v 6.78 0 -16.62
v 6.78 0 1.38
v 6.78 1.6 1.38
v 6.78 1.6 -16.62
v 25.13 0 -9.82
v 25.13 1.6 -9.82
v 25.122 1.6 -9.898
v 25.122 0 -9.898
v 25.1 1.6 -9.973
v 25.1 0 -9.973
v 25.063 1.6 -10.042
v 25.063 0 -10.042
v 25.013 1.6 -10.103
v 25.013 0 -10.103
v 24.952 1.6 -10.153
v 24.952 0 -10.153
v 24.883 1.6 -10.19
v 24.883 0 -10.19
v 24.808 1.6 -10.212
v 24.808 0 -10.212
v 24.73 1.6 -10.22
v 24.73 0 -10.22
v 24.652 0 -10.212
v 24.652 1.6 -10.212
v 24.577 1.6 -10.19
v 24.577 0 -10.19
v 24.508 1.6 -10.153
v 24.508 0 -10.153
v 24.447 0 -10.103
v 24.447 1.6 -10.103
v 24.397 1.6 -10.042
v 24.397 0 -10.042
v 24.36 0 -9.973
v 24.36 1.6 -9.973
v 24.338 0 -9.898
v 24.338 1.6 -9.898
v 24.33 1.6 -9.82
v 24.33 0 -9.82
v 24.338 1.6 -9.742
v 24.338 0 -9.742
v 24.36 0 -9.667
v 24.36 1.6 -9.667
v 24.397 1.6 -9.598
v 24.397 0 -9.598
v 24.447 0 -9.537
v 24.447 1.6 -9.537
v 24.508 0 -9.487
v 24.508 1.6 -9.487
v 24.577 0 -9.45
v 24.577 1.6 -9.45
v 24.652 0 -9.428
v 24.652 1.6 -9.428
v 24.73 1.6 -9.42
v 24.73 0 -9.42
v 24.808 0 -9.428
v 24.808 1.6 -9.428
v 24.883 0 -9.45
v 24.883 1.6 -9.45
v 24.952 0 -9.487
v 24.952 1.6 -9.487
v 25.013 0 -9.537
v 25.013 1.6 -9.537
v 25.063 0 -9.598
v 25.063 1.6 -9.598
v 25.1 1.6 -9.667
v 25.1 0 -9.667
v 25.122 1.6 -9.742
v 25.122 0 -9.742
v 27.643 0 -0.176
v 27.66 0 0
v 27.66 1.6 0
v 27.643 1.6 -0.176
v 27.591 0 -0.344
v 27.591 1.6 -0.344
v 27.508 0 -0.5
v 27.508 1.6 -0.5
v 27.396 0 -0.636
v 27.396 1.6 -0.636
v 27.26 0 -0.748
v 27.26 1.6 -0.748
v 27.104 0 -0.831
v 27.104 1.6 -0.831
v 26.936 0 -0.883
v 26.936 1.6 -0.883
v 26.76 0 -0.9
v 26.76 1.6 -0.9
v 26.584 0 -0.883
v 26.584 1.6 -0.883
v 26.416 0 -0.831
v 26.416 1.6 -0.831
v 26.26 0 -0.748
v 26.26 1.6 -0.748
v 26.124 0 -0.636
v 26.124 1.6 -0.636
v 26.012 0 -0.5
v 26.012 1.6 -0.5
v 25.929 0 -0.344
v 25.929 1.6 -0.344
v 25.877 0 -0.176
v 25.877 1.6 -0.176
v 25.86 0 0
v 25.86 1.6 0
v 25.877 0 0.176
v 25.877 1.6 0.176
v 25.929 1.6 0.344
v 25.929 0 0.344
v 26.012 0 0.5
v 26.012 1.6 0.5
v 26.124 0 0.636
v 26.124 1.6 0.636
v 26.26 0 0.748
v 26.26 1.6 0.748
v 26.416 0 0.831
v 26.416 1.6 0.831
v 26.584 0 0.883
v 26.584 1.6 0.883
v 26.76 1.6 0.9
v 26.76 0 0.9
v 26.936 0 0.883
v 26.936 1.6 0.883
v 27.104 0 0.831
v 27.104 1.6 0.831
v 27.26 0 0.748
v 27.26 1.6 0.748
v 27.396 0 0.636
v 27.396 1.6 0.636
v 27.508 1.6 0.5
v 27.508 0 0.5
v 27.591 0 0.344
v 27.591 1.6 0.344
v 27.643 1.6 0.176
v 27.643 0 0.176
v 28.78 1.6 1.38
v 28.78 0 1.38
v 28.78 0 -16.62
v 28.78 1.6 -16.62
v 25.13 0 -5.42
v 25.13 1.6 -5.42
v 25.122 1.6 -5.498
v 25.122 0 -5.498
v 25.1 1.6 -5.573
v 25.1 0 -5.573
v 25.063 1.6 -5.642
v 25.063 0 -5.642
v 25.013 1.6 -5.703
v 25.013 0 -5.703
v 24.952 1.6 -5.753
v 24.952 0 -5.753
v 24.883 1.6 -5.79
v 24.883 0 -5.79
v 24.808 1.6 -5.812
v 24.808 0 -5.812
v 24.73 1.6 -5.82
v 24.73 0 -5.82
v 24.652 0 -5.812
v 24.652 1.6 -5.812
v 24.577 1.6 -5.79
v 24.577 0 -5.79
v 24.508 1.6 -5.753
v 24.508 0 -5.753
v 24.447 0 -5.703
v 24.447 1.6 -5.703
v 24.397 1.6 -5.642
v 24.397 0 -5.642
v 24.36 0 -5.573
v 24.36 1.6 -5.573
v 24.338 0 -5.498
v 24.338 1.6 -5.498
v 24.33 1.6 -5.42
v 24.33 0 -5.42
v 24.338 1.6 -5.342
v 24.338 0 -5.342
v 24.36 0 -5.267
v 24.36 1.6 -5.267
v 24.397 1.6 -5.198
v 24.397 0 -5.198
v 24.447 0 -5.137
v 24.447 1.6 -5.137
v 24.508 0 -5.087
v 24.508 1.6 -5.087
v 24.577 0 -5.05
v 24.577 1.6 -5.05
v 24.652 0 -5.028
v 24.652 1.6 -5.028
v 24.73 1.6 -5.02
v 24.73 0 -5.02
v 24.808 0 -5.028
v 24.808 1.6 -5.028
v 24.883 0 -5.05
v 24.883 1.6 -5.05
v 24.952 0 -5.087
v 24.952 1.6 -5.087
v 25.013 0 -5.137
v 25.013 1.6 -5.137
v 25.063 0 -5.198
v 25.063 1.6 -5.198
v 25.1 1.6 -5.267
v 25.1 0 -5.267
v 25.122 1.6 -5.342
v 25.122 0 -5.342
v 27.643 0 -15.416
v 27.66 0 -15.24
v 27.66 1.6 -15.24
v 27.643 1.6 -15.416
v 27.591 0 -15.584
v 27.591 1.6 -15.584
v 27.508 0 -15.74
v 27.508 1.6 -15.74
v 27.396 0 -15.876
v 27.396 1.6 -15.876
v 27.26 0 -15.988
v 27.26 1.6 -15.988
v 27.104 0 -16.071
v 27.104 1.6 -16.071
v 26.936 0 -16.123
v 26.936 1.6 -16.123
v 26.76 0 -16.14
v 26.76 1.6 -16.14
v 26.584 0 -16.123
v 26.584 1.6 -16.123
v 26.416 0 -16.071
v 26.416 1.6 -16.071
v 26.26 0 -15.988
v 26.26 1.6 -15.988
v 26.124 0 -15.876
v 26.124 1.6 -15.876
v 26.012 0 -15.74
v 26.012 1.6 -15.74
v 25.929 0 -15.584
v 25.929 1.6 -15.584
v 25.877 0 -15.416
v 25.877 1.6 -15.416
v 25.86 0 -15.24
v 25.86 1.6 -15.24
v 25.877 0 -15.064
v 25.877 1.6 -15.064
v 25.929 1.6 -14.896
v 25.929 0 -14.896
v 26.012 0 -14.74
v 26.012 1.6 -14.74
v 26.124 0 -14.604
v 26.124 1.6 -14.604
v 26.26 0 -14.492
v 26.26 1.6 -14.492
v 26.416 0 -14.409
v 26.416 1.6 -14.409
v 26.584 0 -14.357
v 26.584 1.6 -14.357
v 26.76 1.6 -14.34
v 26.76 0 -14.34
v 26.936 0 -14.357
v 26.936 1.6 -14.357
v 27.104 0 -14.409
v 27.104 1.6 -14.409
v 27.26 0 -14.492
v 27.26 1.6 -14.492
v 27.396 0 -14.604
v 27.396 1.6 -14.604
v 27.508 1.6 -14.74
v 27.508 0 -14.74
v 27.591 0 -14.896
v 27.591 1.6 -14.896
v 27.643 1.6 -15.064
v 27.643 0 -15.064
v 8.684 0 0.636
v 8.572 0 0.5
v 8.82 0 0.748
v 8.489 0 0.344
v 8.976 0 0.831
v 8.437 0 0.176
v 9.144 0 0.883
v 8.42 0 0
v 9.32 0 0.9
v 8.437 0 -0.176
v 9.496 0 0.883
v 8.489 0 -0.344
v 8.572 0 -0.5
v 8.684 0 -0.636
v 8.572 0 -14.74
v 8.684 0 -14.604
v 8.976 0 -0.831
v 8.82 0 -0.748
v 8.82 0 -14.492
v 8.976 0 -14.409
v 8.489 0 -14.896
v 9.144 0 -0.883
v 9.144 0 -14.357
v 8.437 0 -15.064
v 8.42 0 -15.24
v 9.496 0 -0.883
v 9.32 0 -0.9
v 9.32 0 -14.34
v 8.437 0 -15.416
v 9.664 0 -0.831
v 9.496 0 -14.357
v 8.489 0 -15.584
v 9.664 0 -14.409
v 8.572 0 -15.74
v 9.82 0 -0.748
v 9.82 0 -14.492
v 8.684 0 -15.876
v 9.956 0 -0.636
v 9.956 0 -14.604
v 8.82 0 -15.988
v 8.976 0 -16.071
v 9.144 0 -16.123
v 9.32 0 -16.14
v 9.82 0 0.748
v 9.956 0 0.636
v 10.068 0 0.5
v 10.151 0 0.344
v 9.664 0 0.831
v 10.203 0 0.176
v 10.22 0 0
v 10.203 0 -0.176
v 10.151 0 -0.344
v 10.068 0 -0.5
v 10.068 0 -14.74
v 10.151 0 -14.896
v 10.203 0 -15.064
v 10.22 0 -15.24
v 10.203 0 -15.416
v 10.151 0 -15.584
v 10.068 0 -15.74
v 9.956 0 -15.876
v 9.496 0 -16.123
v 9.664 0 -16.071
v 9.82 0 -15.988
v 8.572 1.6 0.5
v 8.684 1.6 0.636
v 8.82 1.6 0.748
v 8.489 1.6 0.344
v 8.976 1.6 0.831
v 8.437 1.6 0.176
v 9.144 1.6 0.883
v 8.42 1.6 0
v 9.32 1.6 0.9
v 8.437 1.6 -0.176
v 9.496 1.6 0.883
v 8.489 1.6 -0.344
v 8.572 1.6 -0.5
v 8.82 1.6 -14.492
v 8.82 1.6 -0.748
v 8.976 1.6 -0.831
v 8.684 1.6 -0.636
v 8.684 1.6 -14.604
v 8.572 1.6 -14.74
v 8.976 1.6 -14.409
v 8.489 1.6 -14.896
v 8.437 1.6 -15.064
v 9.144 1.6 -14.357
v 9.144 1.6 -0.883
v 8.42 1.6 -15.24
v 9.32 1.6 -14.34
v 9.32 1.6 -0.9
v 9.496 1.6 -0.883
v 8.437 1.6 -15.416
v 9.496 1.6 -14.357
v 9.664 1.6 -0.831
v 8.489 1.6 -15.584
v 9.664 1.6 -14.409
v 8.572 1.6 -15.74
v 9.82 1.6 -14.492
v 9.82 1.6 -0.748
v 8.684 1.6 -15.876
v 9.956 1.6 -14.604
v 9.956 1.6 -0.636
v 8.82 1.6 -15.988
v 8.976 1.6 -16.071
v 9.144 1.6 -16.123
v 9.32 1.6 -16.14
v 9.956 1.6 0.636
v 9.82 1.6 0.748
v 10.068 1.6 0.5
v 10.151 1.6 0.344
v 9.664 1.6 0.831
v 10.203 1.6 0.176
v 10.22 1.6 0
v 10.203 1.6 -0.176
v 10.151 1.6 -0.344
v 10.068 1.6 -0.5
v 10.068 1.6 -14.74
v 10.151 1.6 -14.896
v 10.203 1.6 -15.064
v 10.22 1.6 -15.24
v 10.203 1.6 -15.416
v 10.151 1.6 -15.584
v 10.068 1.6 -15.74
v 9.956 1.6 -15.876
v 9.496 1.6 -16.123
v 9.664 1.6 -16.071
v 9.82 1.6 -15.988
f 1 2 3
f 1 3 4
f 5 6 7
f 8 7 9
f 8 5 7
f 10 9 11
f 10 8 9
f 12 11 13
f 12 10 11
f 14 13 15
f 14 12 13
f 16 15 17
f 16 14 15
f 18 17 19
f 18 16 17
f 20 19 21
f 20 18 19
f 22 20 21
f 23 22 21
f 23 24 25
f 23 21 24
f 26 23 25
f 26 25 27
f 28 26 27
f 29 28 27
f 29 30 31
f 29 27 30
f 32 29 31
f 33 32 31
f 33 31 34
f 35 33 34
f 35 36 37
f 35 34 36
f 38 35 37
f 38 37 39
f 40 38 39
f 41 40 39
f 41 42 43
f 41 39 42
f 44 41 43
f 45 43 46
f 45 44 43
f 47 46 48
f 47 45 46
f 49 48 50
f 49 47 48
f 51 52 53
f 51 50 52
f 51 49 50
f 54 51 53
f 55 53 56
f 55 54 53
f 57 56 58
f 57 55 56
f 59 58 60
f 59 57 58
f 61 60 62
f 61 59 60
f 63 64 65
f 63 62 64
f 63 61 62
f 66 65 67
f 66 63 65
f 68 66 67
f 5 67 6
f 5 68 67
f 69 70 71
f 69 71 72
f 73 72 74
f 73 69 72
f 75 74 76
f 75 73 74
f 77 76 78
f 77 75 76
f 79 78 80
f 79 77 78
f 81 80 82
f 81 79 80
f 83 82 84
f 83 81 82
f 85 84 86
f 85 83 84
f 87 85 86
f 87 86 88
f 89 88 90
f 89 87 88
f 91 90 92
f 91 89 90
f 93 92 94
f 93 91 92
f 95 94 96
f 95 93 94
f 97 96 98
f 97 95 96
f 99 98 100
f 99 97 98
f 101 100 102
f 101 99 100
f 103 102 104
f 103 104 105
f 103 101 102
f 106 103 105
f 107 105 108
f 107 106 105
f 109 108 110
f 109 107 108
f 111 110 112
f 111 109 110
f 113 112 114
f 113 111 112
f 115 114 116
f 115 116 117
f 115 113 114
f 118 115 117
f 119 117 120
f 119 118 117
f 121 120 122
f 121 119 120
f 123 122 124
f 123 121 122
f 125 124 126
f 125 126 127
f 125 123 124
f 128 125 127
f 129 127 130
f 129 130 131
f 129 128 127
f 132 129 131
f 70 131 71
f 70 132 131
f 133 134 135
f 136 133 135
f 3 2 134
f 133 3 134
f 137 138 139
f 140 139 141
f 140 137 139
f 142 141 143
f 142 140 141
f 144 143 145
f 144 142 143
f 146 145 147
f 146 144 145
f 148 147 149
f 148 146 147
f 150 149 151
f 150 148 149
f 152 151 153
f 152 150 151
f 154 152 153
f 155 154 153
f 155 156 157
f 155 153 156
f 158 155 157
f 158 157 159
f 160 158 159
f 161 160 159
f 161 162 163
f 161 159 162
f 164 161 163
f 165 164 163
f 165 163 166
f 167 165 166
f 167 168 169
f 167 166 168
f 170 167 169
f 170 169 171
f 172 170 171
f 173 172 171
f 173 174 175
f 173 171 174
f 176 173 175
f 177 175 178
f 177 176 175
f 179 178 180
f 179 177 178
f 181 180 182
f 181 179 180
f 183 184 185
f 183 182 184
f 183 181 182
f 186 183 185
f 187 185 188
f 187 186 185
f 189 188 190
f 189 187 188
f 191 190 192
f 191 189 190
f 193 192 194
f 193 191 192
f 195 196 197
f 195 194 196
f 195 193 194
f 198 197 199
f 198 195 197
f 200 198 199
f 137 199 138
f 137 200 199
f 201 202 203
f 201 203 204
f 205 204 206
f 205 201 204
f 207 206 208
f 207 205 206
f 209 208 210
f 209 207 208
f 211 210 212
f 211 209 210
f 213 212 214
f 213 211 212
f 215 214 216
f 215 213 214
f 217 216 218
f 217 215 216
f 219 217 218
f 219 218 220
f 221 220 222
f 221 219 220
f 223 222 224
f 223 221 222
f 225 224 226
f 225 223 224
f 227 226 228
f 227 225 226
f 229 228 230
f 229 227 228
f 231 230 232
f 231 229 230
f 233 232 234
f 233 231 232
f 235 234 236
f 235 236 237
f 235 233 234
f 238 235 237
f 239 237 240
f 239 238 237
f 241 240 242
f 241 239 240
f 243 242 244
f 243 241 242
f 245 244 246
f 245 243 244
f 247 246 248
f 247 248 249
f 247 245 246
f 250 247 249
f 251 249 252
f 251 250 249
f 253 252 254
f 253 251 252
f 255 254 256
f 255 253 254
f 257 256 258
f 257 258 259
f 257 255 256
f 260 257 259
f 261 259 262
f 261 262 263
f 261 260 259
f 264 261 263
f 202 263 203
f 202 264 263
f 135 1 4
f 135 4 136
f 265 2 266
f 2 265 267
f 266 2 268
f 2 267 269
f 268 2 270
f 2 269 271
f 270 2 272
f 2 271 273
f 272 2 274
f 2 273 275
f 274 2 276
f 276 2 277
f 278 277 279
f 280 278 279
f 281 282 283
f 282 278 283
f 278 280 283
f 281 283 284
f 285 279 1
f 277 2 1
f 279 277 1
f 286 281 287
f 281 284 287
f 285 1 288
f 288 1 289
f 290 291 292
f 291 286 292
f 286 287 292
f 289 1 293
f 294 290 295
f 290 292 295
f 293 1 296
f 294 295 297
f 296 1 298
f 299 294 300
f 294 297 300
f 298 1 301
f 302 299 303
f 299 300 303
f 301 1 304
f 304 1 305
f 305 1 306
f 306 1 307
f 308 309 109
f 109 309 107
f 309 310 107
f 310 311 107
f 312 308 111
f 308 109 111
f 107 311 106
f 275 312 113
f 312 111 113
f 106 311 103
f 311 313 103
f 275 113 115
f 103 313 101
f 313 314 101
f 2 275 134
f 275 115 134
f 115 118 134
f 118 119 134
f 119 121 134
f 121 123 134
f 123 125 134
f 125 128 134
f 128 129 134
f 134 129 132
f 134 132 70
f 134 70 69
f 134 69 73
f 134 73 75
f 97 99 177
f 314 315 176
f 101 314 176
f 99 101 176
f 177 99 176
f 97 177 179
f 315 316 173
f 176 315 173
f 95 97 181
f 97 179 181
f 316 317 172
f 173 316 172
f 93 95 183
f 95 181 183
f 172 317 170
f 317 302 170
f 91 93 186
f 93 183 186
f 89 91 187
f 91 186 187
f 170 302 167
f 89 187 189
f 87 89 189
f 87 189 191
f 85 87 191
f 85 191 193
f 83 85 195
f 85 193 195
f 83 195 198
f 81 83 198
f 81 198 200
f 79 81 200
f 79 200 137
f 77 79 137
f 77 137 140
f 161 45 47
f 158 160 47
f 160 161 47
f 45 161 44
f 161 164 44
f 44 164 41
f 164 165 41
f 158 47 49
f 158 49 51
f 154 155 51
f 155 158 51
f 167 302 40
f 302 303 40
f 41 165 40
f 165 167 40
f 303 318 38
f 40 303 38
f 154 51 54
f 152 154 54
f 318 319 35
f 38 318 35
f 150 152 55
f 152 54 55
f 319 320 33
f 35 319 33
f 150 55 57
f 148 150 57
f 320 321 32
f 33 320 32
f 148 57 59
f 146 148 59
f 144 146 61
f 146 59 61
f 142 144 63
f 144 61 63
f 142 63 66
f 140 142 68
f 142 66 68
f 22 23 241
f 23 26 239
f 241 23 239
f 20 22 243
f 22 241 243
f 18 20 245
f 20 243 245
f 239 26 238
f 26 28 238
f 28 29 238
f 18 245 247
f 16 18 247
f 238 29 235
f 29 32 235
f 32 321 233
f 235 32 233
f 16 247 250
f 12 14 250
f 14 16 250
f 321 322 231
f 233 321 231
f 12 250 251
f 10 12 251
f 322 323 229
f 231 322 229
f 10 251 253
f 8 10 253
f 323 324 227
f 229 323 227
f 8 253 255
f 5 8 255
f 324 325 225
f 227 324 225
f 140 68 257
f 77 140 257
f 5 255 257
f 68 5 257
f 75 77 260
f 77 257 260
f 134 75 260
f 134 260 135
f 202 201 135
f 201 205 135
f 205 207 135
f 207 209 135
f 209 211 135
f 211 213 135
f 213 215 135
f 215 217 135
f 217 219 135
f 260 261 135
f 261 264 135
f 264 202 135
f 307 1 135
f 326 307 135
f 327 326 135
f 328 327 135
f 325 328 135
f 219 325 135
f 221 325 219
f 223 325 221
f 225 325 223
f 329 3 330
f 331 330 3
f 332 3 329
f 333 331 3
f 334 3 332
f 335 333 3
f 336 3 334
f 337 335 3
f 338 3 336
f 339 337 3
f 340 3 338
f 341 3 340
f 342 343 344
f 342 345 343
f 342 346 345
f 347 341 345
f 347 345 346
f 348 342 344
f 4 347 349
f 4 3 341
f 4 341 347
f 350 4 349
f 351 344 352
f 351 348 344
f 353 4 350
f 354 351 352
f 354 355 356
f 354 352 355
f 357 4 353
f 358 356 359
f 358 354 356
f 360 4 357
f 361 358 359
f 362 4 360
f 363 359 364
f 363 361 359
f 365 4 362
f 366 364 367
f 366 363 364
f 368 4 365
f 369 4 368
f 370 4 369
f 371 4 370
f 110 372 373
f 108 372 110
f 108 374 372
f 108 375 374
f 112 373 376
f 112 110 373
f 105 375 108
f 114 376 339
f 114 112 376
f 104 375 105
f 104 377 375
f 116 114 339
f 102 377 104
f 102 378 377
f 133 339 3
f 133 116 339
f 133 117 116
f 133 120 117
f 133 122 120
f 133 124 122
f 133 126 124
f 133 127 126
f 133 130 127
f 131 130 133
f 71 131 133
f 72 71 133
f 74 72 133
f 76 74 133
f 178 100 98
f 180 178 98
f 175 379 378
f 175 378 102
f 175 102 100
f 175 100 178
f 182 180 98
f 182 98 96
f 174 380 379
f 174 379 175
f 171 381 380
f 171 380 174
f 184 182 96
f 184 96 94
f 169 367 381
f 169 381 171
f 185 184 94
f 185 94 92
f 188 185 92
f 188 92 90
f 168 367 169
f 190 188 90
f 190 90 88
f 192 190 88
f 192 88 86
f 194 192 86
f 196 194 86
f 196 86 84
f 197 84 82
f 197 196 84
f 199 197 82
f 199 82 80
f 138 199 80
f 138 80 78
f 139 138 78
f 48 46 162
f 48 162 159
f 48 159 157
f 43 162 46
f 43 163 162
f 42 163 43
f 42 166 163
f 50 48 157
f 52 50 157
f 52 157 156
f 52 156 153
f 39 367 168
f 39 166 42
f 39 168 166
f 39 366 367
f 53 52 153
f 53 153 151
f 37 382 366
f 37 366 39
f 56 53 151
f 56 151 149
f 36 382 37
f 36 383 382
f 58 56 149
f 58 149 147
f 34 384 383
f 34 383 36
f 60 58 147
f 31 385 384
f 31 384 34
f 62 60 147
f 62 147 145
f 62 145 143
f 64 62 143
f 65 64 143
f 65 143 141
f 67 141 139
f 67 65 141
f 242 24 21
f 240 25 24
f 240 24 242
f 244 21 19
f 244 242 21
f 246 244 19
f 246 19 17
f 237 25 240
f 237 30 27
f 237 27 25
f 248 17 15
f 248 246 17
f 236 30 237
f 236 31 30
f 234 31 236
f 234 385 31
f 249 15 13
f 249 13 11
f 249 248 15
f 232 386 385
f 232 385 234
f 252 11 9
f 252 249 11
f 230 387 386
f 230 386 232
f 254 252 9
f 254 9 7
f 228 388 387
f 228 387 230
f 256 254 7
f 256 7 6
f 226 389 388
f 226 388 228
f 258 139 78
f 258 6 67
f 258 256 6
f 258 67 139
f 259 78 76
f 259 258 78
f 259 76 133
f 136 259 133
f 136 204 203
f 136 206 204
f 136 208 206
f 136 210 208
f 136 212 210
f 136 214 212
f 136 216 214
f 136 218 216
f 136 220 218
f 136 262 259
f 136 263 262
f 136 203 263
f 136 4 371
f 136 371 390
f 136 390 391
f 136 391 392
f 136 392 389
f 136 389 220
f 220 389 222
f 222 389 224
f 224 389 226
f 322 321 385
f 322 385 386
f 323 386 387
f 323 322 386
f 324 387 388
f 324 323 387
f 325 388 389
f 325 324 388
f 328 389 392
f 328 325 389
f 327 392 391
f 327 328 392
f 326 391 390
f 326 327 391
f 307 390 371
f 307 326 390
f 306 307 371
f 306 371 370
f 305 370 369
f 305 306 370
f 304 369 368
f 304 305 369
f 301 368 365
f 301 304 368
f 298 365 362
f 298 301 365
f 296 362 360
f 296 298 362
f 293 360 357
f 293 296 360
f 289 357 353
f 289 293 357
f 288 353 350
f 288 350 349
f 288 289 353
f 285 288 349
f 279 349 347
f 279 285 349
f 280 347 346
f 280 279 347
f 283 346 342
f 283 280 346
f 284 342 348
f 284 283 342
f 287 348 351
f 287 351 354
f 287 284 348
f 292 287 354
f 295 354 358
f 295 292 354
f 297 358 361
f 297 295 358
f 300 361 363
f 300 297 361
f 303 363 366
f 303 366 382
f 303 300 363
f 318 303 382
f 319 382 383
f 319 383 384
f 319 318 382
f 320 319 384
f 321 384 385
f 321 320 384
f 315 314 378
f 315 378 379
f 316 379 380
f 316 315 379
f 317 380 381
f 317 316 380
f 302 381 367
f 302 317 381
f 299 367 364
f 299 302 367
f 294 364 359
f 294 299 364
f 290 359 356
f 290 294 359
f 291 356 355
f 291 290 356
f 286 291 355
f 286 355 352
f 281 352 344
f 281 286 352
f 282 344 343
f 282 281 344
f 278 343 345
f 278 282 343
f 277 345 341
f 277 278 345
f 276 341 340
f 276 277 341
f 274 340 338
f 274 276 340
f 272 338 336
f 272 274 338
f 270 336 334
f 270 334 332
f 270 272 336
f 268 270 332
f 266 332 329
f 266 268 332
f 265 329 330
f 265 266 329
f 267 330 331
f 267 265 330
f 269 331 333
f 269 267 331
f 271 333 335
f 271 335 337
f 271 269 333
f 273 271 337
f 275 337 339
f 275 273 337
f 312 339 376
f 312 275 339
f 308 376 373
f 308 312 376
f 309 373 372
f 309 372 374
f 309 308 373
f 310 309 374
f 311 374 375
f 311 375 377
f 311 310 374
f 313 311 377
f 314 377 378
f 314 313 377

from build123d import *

# Parameters (mm, degrees)
SKETCH1_W           = 22
SKETCH1_H           = 18
BOSS_EXTRUDE2_DEPTH = 1.6
SKETCH4_R           = 0.9
CUT_EXTRUDE5_DEPTH  = 1.6
SKETCH9_R           = 0.4
CUT_EXTRUDE6_DEPTH  = 10


with BuildPart() as part:
    # Sketch1 → Boss-Extrude2 (new body)
    with BuildSketch(Plane(origin=(0, 0, 0), x_dir=(1, 0, 0), z_dir=(0, 1, 0))):
        with Locations((17.78, 7.62)):
            Rectangle(SKETCH1_W, SKETCH1_H)
    extrude(amount=BOSS_EXTRUDE2_DEPTH)

    # Sketch4 → Cut-Extrude5 (cut)
    with BuildSketch(Plane(origin=(0, 0, 0), x_dir=(1, 0, 0), z_dir=(0, 1, 0))):
        with Locations((26.76, 15.24)):
            Circle(SKETCH4_R)
        with Locations((26.76, 0)):
            Circle(SKETCH4_R)
        with Locations((9.32, 0)):
            Circle(SKETCH4_R)
        with Locations((9.32, 15.24)):
            Circle(SKETCH4_R)
    extrude(amount=CUT_EXTRUDE5_DEPTH, mode=Mode.SUBTRACT)

    # Sketch9 → Cut-Extrude6 (cut)
    with BuildSketch(Plane(origin=(0, 0, 0), x_dir=(1, 0, 0), z_dir=(0, 1, 0))):
        with Locations((24.73, 5.42)):
            Circle(SKETCH9_R)
        with Locations((24.73, 9.82)):
            Circle(SKETCH9_R)
    extrude(amount=CUT_EXTRUDE6_DEPTH, mode=Mode.SUBTRACT)


solid = part.part
